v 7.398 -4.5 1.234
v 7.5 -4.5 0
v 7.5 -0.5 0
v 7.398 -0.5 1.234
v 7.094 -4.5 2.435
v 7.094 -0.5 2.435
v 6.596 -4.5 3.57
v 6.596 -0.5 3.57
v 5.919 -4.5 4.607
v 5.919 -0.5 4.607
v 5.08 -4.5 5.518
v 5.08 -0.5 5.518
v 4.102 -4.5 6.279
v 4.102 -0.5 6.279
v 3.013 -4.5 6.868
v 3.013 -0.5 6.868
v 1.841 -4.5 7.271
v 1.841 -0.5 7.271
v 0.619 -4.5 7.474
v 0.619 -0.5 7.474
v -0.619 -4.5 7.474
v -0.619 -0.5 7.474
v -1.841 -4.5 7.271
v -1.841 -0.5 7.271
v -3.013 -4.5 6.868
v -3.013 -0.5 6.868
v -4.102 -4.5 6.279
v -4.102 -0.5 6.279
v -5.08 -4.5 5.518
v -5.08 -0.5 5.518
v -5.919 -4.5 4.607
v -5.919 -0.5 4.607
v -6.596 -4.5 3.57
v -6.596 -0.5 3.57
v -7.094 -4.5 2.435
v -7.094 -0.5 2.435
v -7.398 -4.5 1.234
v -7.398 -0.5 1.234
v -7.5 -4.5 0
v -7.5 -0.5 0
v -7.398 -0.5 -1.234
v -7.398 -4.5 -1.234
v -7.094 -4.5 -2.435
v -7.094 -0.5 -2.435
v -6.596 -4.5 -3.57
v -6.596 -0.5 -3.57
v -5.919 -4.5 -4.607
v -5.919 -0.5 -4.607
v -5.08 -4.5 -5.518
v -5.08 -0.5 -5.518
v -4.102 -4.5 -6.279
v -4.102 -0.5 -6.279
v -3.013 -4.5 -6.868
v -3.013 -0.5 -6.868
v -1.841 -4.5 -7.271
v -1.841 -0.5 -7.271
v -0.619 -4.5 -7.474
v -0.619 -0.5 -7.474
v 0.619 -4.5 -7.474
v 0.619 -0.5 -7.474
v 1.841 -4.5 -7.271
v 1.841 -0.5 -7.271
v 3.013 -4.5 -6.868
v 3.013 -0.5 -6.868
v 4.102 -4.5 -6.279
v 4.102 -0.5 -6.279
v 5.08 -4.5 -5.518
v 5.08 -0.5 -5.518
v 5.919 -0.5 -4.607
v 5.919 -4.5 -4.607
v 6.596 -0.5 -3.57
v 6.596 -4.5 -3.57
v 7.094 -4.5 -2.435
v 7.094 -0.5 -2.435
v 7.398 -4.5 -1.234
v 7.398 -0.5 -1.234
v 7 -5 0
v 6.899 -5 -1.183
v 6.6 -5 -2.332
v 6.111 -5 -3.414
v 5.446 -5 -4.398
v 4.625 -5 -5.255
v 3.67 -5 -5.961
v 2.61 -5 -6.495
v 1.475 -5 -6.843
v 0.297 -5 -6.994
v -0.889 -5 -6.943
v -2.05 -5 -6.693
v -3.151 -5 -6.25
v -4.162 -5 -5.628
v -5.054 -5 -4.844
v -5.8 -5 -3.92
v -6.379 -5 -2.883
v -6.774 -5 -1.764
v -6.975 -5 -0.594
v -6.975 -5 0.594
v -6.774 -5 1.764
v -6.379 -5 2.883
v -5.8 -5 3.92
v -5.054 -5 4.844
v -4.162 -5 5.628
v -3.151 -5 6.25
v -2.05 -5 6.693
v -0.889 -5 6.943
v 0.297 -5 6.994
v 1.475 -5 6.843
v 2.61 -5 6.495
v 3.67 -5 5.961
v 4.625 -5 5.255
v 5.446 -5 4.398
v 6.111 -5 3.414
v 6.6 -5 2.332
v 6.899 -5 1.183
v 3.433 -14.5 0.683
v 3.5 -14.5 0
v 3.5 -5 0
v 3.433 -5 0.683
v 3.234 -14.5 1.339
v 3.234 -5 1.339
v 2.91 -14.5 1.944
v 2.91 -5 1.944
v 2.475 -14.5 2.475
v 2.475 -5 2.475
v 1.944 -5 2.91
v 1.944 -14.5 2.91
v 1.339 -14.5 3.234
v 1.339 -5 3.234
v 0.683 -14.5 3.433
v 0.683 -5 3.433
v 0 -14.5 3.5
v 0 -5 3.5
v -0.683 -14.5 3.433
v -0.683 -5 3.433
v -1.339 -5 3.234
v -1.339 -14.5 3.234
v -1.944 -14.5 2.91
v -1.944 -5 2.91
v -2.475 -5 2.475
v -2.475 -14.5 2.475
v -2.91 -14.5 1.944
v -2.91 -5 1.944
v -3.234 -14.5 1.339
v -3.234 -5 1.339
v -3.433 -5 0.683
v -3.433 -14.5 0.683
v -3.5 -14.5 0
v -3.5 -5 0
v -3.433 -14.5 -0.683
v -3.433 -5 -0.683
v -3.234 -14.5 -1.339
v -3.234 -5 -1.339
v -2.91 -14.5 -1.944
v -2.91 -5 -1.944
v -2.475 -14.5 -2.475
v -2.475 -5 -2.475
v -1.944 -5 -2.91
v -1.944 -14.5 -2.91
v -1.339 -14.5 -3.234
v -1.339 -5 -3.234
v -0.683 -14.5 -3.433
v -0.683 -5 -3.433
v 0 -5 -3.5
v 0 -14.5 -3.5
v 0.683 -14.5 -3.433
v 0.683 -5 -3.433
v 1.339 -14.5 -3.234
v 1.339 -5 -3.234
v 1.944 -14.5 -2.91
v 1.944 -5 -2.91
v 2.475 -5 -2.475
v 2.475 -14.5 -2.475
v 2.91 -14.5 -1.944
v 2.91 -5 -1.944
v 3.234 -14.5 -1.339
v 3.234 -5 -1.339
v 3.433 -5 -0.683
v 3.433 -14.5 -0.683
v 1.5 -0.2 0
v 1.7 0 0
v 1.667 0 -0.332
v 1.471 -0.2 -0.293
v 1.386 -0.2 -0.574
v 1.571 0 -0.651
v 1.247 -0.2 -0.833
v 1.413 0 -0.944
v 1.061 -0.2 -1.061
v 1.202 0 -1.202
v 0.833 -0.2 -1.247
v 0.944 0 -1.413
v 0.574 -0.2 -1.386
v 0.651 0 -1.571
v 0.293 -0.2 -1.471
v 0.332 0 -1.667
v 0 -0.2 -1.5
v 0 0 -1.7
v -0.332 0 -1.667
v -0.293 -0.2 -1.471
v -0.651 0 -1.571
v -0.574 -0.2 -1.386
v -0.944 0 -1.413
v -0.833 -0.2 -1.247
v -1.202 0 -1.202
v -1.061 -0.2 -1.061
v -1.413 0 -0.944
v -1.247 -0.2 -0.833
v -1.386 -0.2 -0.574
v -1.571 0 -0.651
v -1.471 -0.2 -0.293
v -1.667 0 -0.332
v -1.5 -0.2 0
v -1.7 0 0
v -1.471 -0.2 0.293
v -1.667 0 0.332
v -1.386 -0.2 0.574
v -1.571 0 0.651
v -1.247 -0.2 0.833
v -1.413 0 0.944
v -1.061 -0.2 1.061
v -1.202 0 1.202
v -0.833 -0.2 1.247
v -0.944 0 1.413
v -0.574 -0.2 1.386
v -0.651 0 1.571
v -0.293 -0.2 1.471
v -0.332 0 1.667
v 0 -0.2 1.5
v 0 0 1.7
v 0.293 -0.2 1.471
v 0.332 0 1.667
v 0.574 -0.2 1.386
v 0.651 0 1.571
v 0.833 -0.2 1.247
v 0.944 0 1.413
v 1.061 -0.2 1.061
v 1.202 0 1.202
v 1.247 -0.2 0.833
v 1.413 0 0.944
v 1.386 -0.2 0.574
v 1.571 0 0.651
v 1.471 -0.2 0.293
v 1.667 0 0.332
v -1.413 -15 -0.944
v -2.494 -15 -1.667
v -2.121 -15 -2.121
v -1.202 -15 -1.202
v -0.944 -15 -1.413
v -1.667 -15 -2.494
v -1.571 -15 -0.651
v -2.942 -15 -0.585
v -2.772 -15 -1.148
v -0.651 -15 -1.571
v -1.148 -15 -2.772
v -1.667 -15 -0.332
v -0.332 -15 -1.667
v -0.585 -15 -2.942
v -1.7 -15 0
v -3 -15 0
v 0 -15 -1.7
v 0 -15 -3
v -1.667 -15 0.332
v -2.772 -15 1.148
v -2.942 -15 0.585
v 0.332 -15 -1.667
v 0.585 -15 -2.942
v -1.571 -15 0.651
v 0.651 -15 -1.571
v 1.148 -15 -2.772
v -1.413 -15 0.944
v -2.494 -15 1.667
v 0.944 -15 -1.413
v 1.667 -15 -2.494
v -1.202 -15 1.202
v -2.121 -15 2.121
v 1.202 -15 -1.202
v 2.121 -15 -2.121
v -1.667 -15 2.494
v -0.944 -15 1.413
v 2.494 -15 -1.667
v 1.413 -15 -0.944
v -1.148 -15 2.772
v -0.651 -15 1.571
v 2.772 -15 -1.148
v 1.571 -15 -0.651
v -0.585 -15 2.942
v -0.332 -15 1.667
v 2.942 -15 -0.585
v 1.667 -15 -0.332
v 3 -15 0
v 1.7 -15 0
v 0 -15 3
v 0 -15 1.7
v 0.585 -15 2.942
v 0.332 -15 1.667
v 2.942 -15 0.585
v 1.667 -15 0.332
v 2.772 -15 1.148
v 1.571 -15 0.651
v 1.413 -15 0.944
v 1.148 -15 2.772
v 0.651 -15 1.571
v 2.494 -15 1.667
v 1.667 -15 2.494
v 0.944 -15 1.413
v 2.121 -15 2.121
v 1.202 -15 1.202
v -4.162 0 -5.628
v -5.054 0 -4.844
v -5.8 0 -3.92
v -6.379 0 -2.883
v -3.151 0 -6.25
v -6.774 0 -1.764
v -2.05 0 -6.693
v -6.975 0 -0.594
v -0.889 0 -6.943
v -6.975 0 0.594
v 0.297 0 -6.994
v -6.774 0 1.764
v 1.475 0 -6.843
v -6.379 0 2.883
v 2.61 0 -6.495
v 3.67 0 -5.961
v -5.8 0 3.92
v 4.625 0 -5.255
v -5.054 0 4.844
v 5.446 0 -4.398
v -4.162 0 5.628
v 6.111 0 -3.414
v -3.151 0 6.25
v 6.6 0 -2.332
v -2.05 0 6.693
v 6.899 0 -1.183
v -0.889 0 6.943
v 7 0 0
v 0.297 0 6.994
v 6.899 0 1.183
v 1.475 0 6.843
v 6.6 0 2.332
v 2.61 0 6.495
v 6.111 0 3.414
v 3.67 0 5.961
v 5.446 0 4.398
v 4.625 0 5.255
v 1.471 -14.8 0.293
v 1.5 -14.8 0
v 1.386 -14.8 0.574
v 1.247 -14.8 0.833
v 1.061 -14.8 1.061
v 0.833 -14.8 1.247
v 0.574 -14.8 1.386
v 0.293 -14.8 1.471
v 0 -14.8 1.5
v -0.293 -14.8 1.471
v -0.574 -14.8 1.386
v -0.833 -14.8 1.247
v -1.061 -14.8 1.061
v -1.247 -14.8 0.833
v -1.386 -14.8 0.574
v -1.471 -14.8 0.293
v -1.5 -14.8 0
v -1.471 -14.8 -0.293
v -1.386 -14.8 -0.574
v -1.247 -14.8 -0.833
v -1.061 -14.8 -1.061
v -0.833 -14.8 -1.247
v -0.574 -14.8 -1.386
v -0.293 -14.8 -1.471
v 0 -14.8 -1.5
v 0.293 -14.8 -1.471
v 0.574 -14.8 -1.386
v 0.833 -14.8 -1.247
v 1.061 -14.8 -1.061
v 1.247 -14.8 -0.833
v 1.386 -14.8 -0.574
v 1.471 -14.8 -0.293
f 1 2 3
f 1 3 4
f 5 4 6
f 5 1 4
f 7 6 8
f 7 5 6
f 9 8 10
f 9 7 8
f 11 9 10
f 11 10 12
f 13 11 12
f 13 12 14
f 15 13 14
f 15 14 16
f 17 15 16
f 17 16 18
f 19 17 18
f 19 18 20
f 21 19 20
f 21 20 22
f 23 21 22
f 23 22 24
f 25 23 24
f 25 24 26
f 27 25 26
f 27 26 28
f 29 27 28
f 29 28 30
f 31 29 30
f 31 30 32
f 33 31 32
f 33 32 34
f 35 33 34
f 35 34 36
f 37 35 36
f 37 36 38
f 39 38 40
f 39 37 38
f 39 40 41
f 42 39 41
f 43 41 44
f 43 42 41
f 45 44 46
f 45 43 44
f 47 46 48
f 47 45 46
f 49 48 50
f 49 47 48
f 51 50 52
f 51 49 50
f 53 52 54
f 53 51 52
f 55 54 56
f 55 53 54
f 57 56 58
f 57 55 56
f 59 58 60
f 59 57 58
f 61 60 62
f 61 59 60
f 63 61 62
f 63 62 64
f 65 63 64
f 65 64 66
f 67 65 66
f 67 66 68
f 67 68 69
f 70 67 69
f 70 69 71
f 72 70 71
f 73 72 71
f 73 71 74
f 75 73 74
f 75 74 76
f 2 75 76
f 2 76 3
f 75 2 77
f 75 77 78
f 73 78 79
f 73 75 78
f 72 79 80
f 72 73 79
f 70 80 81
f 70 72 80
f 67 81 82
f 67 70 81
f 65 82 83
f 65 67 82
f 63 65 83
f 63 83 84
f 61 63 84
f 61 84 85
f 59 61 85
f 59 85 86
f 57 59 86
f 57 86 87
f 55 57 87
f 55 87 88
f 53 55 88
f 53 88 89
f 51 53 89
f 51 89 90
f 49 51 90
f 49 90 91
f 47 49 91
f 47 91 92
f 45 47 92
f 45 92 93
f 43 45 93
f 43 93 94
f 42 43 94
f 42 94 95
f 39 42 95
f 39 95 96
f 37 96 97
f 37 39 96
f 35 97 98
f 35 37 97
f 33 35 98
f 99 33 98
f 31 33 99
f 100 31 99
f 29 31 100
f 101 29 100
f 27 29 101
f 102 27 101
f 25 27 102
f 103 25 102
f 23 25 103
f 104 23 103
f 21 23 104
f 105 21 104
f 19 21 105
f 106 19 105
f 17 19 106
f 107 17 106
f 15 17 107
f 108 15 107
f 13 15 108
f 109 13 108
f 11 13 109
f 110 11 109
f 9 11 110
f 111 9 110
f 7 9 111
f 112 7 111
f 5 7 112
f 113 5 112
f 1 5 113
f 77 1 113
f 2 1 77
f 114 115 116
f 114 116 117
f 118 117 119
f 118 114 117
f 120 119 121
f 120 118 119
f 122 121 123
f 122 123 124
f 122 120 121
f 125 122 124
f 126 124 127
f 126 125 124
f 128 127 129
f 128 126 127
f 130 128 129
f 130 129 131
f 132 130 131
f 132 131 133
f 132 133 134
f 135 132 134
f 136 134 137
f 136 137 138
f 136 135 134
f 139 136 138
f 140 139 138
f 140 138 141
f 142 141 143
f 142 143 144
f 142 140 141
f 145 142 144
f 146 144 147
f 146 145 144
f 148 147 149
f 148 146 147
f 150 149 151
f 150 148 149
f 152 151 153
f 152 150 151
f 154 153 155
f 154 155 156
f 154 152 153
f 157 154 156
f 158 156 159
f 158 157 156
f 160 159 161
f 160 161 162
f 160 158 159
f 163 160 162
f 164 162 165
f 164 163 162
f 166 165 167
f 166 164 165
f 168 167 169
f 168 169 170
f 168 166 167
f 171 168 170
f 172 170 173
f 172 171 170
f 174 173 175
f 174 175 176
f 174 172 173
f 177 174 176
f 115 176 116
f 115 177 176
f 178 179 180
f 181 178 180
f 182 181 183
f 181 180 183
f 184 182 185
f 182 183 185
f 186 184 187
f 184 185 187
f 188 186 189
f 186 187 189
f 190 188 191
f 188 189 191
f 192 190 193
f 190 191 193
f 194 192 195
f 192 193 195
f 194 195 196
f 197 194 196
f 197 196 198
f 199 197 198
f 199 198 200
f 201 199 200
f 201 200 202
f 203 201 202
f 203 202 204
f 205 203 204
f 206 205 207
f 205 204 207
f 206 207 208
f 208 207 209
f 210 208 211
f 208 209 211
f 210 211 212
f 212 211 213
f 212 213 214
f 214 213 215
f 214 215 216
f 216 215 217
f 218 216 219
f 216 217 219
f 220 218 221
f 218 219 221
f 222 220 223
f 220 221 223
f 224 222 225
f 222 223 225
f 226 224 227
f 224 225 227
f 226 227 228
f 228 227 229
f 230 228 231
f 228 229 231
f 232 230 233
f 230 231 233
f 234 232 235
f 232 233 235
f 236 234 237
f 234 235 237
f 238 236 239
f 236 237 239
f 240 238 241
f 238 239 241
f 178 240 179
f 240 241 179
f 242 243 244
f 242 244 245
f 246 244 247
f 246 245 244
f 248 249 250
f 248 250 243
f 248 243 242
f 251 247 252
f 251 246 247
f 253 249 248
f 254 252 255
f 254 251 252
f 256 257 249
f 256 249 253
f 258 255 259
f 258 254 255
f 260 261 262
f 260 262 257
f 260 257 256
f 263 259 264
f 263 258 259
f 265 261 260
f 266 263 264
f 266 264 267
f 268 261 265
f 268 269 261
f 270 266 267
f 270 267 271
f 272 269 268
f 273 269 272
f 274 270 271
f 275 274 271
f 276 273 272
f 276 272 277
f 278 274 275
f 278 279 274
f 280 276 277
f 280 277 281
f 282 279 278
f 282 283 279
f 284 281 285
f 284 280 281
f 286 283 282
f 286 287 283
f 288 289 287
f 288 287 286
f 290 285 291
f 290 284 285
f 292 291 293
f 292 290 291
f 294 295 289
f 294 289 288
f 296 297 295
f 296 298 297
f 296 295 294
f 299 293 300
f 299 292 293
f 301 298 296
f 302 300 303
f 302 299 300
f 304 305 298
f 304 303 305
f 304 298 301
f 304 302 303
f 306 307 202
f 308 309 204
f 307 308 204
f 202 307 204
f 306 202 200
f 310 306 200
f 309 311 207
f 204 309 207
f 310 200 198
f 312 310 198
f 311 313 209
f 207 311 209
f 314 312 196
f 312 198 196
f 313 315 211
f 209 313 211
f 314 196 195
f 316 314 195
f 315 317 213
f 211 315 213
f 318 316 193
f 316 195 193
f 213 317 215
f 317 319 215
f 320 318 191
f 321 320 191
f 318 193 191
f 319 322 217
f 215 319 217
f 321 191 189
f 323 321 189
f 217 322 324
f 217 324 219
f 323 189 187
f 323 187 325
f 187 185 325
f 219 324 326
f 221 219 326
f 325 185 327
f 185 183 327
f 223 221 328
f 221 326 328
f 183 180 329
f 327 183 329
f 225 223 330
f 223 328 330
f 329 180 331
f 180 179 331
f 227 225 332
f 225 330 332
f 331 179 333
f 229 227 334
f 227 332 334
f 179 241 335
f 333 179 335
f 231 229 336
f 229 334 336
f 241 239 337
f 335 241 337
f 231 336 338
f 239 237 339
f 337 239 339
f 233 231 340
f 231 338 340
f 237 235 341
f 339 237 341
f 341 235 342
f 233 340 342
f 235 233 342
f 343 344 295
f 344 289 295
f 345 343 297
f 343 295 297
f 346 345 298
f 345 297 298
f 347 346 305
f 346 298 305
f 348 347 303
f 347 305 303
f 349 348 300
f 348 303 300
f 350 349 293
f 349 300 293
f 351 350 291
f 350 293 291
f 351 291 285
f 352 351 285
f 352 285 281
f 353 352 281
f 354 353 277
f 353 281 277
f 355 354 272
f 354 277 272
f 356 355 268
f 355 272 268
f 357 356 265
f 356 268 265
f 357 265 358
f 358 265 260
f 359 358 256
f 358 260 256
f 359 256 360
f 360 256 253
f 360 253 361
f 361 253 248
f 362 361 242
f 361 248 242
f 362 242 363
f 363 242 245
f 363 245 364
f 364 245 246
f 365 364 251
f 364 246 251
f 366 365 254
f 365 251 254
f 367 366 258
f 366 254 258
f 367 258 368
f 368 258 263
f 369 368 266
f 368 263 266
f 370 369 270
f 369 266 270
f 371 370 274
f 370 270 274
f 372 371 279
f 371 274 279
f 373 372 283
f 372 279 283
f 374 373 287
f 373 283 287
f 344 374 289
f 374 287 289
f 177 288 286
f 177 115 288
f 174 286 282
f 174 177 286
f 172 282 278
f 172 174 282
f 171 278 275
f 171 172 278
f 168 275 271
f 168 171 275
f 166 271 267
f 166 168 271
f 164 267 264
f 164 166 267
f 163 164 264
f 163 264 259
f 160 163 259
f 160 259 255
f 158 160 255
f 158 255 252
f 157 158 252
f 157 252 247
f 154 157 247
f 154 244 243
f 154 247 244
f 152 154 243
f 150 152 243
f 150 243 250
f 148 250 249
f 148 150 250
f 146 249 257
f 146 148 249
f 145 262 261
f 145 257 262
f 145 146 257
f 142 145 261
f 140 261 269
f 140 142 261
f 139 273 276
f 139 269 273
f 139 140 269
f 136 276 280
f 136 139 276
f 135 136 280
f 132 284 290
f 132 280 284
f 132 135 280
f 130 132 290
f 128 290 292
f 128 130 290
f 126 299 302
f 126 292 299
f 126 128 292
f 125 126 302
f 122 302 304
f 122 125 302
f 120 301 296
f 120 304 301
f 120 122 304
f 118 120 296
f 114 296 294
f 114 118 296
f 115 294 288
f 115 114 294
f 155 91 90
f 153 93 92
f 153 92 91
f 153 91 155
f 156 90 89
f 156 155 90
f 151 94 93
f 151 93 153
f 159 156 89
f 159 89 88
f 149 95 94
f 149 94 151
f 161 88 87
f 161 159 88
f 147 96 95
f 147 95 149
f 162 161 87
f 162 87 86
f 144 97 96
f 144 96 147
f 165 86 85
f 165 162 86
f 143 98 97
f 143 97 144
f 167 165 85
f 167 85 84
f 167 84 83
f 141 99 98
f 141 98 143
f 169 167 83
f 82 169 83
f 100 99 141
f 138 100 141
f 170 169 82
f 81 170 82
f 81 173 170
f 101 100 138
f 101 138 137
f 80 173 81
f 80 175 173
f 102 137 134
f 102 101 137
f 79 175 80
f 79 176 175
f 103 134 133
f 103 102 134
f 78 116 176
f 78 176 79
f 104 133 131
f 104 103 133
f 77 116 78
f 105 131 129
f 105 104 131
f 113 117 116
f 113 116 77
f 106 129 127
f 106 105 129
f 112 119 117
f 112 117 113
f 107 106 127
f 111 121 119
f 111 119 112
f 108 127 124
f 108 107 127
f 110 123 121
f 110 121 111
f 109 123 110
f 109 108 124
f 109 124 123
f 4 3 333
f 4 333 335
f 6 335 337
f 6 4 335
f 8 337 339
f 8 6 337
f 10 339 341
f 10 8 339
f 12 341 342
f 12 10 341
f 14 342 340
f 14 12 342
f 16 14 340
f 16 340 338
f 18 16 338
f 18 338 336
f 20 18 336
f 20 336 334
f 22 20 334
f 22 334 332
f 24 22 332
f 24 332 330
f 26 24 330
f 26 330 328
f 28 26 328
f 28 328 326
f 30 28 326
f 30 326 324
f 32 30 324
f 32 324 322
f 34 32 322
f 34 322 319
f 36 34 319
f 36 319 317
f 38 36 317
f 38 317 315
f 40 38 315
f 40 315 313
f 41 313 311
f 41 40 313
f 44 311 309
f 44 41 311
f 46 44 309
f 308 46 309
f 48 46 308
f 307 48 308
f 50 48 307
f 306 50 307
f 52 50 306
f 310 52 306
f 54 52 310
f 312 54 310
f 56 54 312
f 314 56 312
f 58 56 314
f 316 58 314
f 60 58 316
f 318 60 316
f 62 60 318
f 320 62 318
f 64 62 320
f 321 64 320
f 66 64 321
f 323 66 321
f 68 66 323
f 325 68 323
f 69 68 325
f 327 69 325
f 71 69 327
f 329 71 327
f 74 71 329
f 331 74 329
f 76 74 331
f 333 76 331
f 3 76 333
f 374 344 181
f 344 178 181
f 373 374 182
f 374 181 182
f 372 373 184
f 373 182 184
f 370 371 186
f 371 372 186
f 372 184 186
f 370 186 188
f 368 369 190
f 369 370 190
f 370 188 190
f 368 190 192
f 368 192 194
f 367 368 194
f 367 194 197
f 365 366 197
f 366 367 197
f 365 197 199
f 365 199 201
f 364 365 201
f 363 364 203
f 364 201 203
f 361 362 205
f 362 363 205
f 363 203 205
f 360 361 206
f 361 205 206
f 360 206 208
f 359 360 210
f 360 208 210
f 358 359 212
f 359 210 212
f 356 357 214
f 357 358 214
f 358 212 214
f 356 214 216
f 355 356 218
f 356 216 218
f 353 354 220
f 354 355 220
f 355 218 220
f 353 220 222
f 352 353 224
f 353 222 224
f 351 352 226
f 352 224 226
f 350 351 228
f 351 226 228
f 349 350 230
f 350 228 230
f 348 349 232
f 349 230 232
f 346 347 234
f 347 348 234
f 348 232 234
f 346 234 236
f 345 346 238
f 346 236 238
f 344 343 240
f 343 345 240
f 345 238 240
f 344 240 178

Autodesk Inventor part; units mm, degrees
ref_plane "YZ Plane" through (0, 0, 0) normal (1, 0, 0) x (0, 1, 0)
ref_plane "XZ Plane" through (0, 0, 0) normal (0, 1, 0) x (-1, 0, 0)
ref_plane "XY Plane" through (0, 0, 0) normal (0, 0, 1) x (1, 0, 0)
sketch "Sketch1" plane through (0, 0, 0) normal (0, 0, 1) x (1, 0, 0)
  line L0 (0, 0) -> (0, -15) construction
  line L1 (1.5, 0) -> (7.5, 0)
  line L2 (7.5, 0) -> (7.5, -5)
  line L3 (7.5, -5) -> (3.5, -5)
  line L4 (3.5, -5) -> (3.5, -15)
  line L5 (3.5, -15) -> (1.5, -15)
  line L6 (1.5, -15) -> (1.5, 0)
  dimension "d0" = 1.5
  dimension "d1" = 7.5
  dimension "d2" = 5
  dimension "d3" = 10
  dimension "Length" = 15
  dimension "d5" = 3.5
revolve "Revolution1" add sketch "Sketch1" angle 360 about axis through (0, 0, 0) along (0, -1, 0)
chamfer "Chamfer1" distance 0.5 angle 45 3 edges at (-7.5, 0, 0) (-7.5, -5, 0) (-3.5, -15, 0)
chamfer "Chamfer2" distance 0.2 angle 45 2 edges at (-1.5, 0, 0) (-1.5, -15, 0)
equation "\"Diameter\" = 15"
properties part number "Bush" material "Bronze, Soft Tin"
